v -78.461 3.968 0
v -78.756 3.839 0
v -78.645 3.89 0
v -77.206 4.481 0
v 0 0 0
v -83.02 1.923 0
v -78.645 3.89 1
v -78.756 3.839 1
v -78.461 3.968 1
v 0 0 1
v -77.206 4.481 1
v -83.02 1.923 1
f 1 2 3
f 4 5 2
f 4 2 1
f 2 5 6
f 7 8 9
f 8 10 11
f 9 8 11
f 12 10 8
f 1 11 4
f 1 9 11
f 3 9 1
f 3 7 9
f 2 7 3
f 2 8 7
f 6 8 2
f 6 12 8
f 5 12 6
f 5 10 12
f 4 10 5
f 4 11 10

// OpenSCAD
// Generated by SolidPython 1.1.3 on 2024-05-19 23:35:49


linear_extrude(height = 1) {
	polygon(points = [[0, 0], [-77.2058109375, 4.4808039062], [-77.2628695312, 4.4574755469], [-77.3199281250, 4.4341471875], [-77.3769867187, 4.4108188281], [-77.4340453125, 4.3874904688], [-77.4911039062, 4.3641621094], [-77.5481625000, 4.3408337500], [-77.6052210937, 4.3175053906], [-77.6622796875, 4.2941770312], [-77.7193382812, 4.2708486719], [-77.7763968750, 4.2475203125], [-77.8334554687, 4.2241919531], [-77.8905140625, 4.2008635938], [-77.9475726562, 4.1775352344], [-78.0046312500, 4.1542068750], [-78.0616898437, 4.1308785156], [-78.1187484375, 4.1075501562], [-78.1758070312, 4.0842217969], [-78.2328656250, 4.0608934375], [-78.2899242187, 4.0375650781], [-78.3469828125, 4.0142367188], [-78.4040414063, 3.9909083594], [-78.4611000000, 3.9675800000], [-78.5530000000, 3.9289400000], [-78.6449000000, 3.8903000000], [-78.7004500000, 3.8648350000], [-78.7560000000, 3.8393700000], [-78.8247804687, 3.8084546641], [-78.8935609375, 3.7775393281], [-78.9623414063, 3.7466239922], [-79.0311218750, 3.7157086563], [-79.0999023437, 3.6847933203], [-79.1686828125, 3.6538779844], [-79.2374632813, 3.6229626484], [-79.3062437500, 3.5920473125], [-79.3750242187, 3.5611319766], [-79.4438046875, 3.5302166406], [-79.5125851562, 3.4993013047], [-79.5813656250, 3.4683859688], [-79.6501460937, 3.4374706328], [-79.7189265625, 3.4065552969], [-79.7877070312, 3.3756399609], [-79.8564875000, 3.3447246250], [-79.9252679688, 3.3138092891], [-79.9940484375, 3.2828939531], [-80.0628289063, 3.2519786172], [-80.1316093750, 3.2210632813], [-80.2003898438, 3.1901479453], [-80.2691703125, 3.1592326094], [-80.3379507813, 3.1283172734], [-80.4067312500, 3.0974019375], [-80.4755117187, 3.0664866016], [-80.5442921875, 3.0355712656], [-80.6130726563, 3.0046559297], [-80.6818531250, 2.9737405938], [-80.7506335937, 2.9428252578], [-80.8194140625, 2.9119099219], [-80.8881945313, 2.8809945859], [-80.9569750000, 2.8500792500], [-81.0257554687, 2.8191639141], [-81.0945359375, 2.7882485781], [-81.1633164063, 2.7573332422], [-81.2320968750, 2.7264179063], [-81.3008773437, 2.6955025703], [-81.3696578125, 2.6645872344], [-81.4384382813, 2.6336718984], [-81.5072187500, 2.6027565625], [-81.5759992187, 2.5718412266], [-81.6447796875, 2.5409258906], [-81.7135601562, 2.5100105547], [-81.7823406250, 2.4790952188], [-81.8511210937, 2.4481798828], [-81.9199015625, 2.4172645469], [-81.9886820312, 2.3863492109], [-82.0574625000, 2.3554338750], [-82.1262429688, 2.3245185391], [-82.1950234375, 2.2936032031], [-82.2638039063, 2.2626878672], [-82.3325843750, 2.2317725312], [-82.4013648438, 2.2008571953], [-82.4701453125, 2.1699418594], [-82.5389257813, 2.1390265234], [-82.6077062500, 2.1081111875], [-82.6764867187, 2.0771958516], [-82.7452671875, 2.0462805156], [-82.8140476563, 2.0153651797], [-82.8828281250, 1.9844498438], [-82.9516085937, 1.9535345078], [-83.0203890625, 1.9226191719]]);
}
/***********************************************
*********      SolidPython code:      **********
************************************************
 
import math
import time

from stl import mesh, Dimension

from tkinter import Tk     # from tkinter import Tk for Python 3.x
from tkinter.filedialog import askopenfilename
from mpl_toolkits.mplot3d import art3d
from matplotlib import pyplot as plt
import solid
import os
import ezdxf
import shapely.geometry as sg
import subprocess
from GUI import getSCADPath



def outputSTL(From, To, PATH=getSCADPath()):
    subprocess.Popen(PATH + " -o " + To + " " + From)
    while not os.path.exists(To):
        time.sleep(1)


def get_size(i):
    x_list = [int(a) for a in str(i)]
    return len(x_list)



class Model:
    def __init__(self, model, fileName, location, layer, thickness):
        self.location = location
        self.code = None
        self.fileName = fileName
        self.stl = fileName + ".stl"
        self.layer = layer
        self.thickness = thickness
        self.maxz = (layer+1)*thickness
        self.dxf = fileName + ".dxf"
        self.scad = fileName + ".scad"
        self.model = model
        self.center = None
        self.width = 10
        self.mesh = None
        self.useable_area = None


    def get_code(self):
        max_dim = 0.05
        max_array = 6

        num = int(self.fileName)
        nums = [int(a) for a in str(num)]
        nums.reverse()
        indices = nums
        length = len(nums)

        print(indices)
        t = 0
        i = 0
        cubes = []
        x = 0
        y = 0
        width = 0.01
        while x <= max_dim:
            while y <= max_dim:
                print(indices)
                if nums == []:
                    break
                if indices[0] != 0:
                    cubes.append(solid.translate([x, y, 0])(solid.cube(size=t / 1000 + 0.001)))
                    y += max_dim / (max_array - 1)
                    nums[0] = nums[0] - 1
                else:
                    indices.pop(0)
                    t += 1
                i += 1
            x += max_dim / (max_array - 1)
            y = 0

        outside = solid.translate([-width / 2, -width / 2])(solid.cube(max_dim + (length - 1) / 1000 + 0.001 + width))
        self.code = solid.difference()(outside, cubes)
        self.code = solid.projection(cut=True)(self.code)
        solid.scad_render_to_file(self.code, self.location + "/code.scad")
        outputSTL(From=self.location+"/code.scad", To=self.location+"code.dxf", PATH=getSCADPath())
        # os.system("toSTL.sh renders/code.scad renders/code.dxf")
        return self.location+"/code.dxf"

    def download(self, type):
        if type =="stl":
            print("generating:" + self.location+"/"+ self.fileName+".stl")
            outputSTL(From=self.location+"/"+self.fileName+".scad", To=self.location+"/"+self.fileName+".stl")
            # os.system("toSTL.sh renders/"+ self.fileName+".scad renders/"+ self.fileName+".stl")
        elif type == "dxf":
            outputSTL(From=self.location+"/"+self.fileName+".scad", To=self.location+"/"+self.fileName+".dxf")
            # os.system("toSTL.sh renders/"+ self.fileName+".scad renders/"+ self.fileName+".dxf")

    def render(self):
        solid.scad_render_to_file(self.model, self.location+"/"+ self.fileName+'.scad')
        while not os.path.exists(self.location+"/"+self.fileName+".scad"):
            time.sleep(1)

    def get_points(self):
        doc = ezdxf.readfile(filename=self.location+"/"+ self.fileName+".dxf")
        msp = doc.modelspace()
        i=0
        lists = []
        def helper(e):
            start = [e.dxf.start[0], e.dxf.start[1]]
            end = [e.dxf.end[0], e.dxf.end[1]]
            return [start, end]

        for e in msp.query("LINE"):
            line = helper(e)
            if not lists:
                lists.append([line])
            else:
                if lists[i][len(lists)-1][1] != line[0]:
                    lists.append([line])
                    i+=1
                else:
                    lists[i].append(line)

    def get_points2(self, FILE):
        doc = ezdxf.readfile(filename=FILE)
        msp = doc.modelspace()
        i = 0
        lists = []

        def helper(e):
            start = [e.dxf.start[0], e.dxf.start[1]]
            end = [e.dxf.end[0], e.dxf.end[1]]
            return (start, end)

        for e in msp.query("LINE"):
            line = helper(e)
            if lists==[]:
                lists.append([line])
            else:
                if lists[i][len(lists[i]) - 1][1] != line[0]:
                    lists.append([line])
                    i += 1
                else:
                    lists[i].append(line)
        return lists

    def add_code(self):
        dxf = solid.projection(cut=False)(self.model)
        offset = solid.offset(r=-0.1)(dxf)
        solid.scad_render_to_file(offset, self.location+'/offset.scad')
        os.system("toSTL.sh renders/offset.scad renders/offset.dxf")
        lines = self.get_points2("renders/offset.dxf")
        x = lines[0][0][0][0]
        y = lines[0][0][0][1]
        print(x)
        print(y)
        code = solid.translate([x,y,0])(self.code)
        code = solid.linear_extrude(height=999)(code)
        save = self.model
        self.model = solid.projection()(solid.difference()(self.model, code))
        self.render()
        self.download("dxf")
        self.model = save

    def add_label(self, pos):
        # num = 12
        # minx, maxx, miny, maxy, minz, maxz = self.find_minmax()
        maxz = self.maxz
        # label = solid.linear_extrude(height=(maxz-minz)/3)(solid.text(str(self.fileName), size=0.5, halign="center"))
        # i=minx
        # print("x-len: " + str(maxx-minx))
        # print(i)
        # inc = (maxx-minx)/num
        # while minx <= i <= maxx:
        #     label = solid.union()(solid.translate([i, 0, maxz - 0.2])(solid.linear_extrude(height=(maxz-minz)/3)(solid.text(str(self.fileName), size=0.25, halign="center"))), label)
        #     i += inc
        #
        # l = label
        #
        # i =miny
        # while miny<= i <= maxy:
        #     print("y inc")
        #     l = solid.union()(solid.translate([0, i, 0])(label), l)
        #     i += 0.5
        for i in str(self.fileName):
            cur = pos[0]
            label = solid.translate([pos[0][0], pos[0][1], self.maxz-0.2])(solid.linear_extrude(height=(self.thickness)/3)(solid.text(str(i), size=0.5, halign="center", valign="center")))
            self.model = solid.difference()(self.model, label)
            pos.append(pos.pop(0))
            while abs(cur[0]-pos[0][0])<0.5 and abs(cur[1]-pos[0][1])<0.5:
                pos.append(pos.pop(0))



    def Center(self):

        volume, cog, inertia = self.mesh.get_mass_properties()
        print("Volume                                  = {0}".format(volume))
        print("Position of the center of gravity (COG) = {0}".format(cog))
        m_centered = solid.translate([-cog[0], -cog[1], 0])(
            self.model
        )
        return m_centered

    def find_minmax(self):
        minx = maxx = miny = maxy = minz = maxz = None
        for p in self.mesh.points:
            # p contains (x, y, z)
            if minx is None:
                minx = p[Dimension.X]
                maxx = p[Dimension.X]
                miny = p[Dimension.Y]
                maxy = p[Dimension.Y]
                minz = p[Dimension.Z]
                maxz = p[Dimension.Z]
            else:
                maxx = max(p[Dimension.X], maxx)
                minx = min(p[Dimension.X], minx)
                maxy = max(p[Dimension.Y], maxy)
                miny = min(p[Dimension.Y], miny)
                maxz = max(p[Dimension.Z], maxz)
                minz = min(p[Dimension.Z], minz)
        lenx = maxx - minx
        leny = maxy - miny
        lenz = maxz - minz
        return minx, maxx, miny, maxy, minz, maxz

    # def generate_Mesh(self):
    #     self.mesh = mesh.Mesh.from_file(self.location + "/" + str(int(self.fileName)//8)+ "b.stl")

    def get_top(self):
        top = solid.projection(cut=True)(solid.translate([0,0,-1*self.thickness*(self.layer+1)])(self.model))
        useable_area = solid.offset(r=-0.45)(top)
        self.useable_area = useable_area
        solid.scad_render_to_file(self.useable_area, self.location+'/' + 'toptemp.scad')
        outputSTL(From=self.location+'/' + 'toptemp.scad', To=self.location+"/top"+ self.dxf)

        # os.system("toSTL.sh out/toptemp.scad renders/" + self.fileName + ".dxf")
        dxf = DXF(self.location+"/top"+ self.dxf)
        min_p=dxf.points[0][0]
        points_ordered = dxf.points
        i=0
        while i <= len(dxf.points)+1:
            while math.sqrt((dxf.points[0][0]-dxf.points[1][0])**2+(dxf.points[0][1]-dxf.points[1][1])**2) > 0.1:
                dxf.points.insert(1, [(dxf.points[0][0]+dxf.points[1][0])/2, (dxf.points[0][1]+dxf.points[1][1])/2])
                i = i-1
            dxf.points.append(dxf.points.pop(0))
            i+=1
        for i in range(len(dxf.points)):
            dxf.points.append(dxf.points.pop(0))
            if dxf.points[0][0] < min_p:
                min_p = dxf.points[0][0]
                points_ordered = dxf.points.copy()
        dxf.points = points_ordered.copy()

        print(dxf.points)
        self.add_label(dxf.points)

class DXF:
    def __init__(self, file):
        self.file = file
        self.Lines = []
        self.points = []
        doc = ezdxf.readfile(self.file)
        msp = doc.modelspace()
        for e in msp:
            if e.dxftype() == "LINE":
                self.Lines.append(e)
                self.points.append([e.dxf.start[0], e.dxf.start[1]])
        # self.points.append([self.Lines[-1].dxf.end[0], self.Lines[-1].dxf.end[1]])
        self.area = None
        self.center = None
        self.polygon = sg.Polygon(self.points)

    def get_area(self):
        self.area = self.polygon.area
        return self.area

    def get_center(self):
        x_sum = 0
        y_sum =0
        for i in self.points:
            x_sum += i[0]
            y_sum += i[1]
        x_c = x_sum/len(self.points)
        y_c = y_sum/len(self.points)
        return (x_c, y_c)

    def split(self, maxdim):
        splits = []
        length = 0
        pieces = [[]]
        prev = self.points[0]
        for j in self.points:
            length = length + math.sqrt((prev[0]-j[0])**2+(prev[1]-j[1])**2)
            if length >= maxdim:
                pieces[-1].append(j)
                pieces.append([])
                length = 0
            pieces[-1].append(j)
            prev = j
        for j in pieces:
            j.insert(0, [0,0])
            piece = solid.linear_extrude(height=1)(solid.polygon(j))
            splits.append(piece)
        return splits
    def refine_points(self):
        i=0
        while i <= len(self.points)+1:
            while math.sqrt((self.points[0][0]-self.points[1][0])**2+(self.points[0][1]-self.points[1][1])**2) > 0.1:
                self.points.insert(1, [(self.points[0][0]+self.points[1][0])/2, (self.points[0][1]+self.points[1][1])/2])
                i = i-1
            self.points.append(self.points.pop(0))
            i+=1


if __name__== "__main__":
    test = DXF("C:/Users/Daniel/Documents/repos/Shell_Maker/output/0top_slice.dxf")
    test.refine_points()
    k = test.split(48)
    for i in range(len(k)):
        solid.scad_render_to_file(k[i], str(i) + ".scad")


 
 
************************************************/
